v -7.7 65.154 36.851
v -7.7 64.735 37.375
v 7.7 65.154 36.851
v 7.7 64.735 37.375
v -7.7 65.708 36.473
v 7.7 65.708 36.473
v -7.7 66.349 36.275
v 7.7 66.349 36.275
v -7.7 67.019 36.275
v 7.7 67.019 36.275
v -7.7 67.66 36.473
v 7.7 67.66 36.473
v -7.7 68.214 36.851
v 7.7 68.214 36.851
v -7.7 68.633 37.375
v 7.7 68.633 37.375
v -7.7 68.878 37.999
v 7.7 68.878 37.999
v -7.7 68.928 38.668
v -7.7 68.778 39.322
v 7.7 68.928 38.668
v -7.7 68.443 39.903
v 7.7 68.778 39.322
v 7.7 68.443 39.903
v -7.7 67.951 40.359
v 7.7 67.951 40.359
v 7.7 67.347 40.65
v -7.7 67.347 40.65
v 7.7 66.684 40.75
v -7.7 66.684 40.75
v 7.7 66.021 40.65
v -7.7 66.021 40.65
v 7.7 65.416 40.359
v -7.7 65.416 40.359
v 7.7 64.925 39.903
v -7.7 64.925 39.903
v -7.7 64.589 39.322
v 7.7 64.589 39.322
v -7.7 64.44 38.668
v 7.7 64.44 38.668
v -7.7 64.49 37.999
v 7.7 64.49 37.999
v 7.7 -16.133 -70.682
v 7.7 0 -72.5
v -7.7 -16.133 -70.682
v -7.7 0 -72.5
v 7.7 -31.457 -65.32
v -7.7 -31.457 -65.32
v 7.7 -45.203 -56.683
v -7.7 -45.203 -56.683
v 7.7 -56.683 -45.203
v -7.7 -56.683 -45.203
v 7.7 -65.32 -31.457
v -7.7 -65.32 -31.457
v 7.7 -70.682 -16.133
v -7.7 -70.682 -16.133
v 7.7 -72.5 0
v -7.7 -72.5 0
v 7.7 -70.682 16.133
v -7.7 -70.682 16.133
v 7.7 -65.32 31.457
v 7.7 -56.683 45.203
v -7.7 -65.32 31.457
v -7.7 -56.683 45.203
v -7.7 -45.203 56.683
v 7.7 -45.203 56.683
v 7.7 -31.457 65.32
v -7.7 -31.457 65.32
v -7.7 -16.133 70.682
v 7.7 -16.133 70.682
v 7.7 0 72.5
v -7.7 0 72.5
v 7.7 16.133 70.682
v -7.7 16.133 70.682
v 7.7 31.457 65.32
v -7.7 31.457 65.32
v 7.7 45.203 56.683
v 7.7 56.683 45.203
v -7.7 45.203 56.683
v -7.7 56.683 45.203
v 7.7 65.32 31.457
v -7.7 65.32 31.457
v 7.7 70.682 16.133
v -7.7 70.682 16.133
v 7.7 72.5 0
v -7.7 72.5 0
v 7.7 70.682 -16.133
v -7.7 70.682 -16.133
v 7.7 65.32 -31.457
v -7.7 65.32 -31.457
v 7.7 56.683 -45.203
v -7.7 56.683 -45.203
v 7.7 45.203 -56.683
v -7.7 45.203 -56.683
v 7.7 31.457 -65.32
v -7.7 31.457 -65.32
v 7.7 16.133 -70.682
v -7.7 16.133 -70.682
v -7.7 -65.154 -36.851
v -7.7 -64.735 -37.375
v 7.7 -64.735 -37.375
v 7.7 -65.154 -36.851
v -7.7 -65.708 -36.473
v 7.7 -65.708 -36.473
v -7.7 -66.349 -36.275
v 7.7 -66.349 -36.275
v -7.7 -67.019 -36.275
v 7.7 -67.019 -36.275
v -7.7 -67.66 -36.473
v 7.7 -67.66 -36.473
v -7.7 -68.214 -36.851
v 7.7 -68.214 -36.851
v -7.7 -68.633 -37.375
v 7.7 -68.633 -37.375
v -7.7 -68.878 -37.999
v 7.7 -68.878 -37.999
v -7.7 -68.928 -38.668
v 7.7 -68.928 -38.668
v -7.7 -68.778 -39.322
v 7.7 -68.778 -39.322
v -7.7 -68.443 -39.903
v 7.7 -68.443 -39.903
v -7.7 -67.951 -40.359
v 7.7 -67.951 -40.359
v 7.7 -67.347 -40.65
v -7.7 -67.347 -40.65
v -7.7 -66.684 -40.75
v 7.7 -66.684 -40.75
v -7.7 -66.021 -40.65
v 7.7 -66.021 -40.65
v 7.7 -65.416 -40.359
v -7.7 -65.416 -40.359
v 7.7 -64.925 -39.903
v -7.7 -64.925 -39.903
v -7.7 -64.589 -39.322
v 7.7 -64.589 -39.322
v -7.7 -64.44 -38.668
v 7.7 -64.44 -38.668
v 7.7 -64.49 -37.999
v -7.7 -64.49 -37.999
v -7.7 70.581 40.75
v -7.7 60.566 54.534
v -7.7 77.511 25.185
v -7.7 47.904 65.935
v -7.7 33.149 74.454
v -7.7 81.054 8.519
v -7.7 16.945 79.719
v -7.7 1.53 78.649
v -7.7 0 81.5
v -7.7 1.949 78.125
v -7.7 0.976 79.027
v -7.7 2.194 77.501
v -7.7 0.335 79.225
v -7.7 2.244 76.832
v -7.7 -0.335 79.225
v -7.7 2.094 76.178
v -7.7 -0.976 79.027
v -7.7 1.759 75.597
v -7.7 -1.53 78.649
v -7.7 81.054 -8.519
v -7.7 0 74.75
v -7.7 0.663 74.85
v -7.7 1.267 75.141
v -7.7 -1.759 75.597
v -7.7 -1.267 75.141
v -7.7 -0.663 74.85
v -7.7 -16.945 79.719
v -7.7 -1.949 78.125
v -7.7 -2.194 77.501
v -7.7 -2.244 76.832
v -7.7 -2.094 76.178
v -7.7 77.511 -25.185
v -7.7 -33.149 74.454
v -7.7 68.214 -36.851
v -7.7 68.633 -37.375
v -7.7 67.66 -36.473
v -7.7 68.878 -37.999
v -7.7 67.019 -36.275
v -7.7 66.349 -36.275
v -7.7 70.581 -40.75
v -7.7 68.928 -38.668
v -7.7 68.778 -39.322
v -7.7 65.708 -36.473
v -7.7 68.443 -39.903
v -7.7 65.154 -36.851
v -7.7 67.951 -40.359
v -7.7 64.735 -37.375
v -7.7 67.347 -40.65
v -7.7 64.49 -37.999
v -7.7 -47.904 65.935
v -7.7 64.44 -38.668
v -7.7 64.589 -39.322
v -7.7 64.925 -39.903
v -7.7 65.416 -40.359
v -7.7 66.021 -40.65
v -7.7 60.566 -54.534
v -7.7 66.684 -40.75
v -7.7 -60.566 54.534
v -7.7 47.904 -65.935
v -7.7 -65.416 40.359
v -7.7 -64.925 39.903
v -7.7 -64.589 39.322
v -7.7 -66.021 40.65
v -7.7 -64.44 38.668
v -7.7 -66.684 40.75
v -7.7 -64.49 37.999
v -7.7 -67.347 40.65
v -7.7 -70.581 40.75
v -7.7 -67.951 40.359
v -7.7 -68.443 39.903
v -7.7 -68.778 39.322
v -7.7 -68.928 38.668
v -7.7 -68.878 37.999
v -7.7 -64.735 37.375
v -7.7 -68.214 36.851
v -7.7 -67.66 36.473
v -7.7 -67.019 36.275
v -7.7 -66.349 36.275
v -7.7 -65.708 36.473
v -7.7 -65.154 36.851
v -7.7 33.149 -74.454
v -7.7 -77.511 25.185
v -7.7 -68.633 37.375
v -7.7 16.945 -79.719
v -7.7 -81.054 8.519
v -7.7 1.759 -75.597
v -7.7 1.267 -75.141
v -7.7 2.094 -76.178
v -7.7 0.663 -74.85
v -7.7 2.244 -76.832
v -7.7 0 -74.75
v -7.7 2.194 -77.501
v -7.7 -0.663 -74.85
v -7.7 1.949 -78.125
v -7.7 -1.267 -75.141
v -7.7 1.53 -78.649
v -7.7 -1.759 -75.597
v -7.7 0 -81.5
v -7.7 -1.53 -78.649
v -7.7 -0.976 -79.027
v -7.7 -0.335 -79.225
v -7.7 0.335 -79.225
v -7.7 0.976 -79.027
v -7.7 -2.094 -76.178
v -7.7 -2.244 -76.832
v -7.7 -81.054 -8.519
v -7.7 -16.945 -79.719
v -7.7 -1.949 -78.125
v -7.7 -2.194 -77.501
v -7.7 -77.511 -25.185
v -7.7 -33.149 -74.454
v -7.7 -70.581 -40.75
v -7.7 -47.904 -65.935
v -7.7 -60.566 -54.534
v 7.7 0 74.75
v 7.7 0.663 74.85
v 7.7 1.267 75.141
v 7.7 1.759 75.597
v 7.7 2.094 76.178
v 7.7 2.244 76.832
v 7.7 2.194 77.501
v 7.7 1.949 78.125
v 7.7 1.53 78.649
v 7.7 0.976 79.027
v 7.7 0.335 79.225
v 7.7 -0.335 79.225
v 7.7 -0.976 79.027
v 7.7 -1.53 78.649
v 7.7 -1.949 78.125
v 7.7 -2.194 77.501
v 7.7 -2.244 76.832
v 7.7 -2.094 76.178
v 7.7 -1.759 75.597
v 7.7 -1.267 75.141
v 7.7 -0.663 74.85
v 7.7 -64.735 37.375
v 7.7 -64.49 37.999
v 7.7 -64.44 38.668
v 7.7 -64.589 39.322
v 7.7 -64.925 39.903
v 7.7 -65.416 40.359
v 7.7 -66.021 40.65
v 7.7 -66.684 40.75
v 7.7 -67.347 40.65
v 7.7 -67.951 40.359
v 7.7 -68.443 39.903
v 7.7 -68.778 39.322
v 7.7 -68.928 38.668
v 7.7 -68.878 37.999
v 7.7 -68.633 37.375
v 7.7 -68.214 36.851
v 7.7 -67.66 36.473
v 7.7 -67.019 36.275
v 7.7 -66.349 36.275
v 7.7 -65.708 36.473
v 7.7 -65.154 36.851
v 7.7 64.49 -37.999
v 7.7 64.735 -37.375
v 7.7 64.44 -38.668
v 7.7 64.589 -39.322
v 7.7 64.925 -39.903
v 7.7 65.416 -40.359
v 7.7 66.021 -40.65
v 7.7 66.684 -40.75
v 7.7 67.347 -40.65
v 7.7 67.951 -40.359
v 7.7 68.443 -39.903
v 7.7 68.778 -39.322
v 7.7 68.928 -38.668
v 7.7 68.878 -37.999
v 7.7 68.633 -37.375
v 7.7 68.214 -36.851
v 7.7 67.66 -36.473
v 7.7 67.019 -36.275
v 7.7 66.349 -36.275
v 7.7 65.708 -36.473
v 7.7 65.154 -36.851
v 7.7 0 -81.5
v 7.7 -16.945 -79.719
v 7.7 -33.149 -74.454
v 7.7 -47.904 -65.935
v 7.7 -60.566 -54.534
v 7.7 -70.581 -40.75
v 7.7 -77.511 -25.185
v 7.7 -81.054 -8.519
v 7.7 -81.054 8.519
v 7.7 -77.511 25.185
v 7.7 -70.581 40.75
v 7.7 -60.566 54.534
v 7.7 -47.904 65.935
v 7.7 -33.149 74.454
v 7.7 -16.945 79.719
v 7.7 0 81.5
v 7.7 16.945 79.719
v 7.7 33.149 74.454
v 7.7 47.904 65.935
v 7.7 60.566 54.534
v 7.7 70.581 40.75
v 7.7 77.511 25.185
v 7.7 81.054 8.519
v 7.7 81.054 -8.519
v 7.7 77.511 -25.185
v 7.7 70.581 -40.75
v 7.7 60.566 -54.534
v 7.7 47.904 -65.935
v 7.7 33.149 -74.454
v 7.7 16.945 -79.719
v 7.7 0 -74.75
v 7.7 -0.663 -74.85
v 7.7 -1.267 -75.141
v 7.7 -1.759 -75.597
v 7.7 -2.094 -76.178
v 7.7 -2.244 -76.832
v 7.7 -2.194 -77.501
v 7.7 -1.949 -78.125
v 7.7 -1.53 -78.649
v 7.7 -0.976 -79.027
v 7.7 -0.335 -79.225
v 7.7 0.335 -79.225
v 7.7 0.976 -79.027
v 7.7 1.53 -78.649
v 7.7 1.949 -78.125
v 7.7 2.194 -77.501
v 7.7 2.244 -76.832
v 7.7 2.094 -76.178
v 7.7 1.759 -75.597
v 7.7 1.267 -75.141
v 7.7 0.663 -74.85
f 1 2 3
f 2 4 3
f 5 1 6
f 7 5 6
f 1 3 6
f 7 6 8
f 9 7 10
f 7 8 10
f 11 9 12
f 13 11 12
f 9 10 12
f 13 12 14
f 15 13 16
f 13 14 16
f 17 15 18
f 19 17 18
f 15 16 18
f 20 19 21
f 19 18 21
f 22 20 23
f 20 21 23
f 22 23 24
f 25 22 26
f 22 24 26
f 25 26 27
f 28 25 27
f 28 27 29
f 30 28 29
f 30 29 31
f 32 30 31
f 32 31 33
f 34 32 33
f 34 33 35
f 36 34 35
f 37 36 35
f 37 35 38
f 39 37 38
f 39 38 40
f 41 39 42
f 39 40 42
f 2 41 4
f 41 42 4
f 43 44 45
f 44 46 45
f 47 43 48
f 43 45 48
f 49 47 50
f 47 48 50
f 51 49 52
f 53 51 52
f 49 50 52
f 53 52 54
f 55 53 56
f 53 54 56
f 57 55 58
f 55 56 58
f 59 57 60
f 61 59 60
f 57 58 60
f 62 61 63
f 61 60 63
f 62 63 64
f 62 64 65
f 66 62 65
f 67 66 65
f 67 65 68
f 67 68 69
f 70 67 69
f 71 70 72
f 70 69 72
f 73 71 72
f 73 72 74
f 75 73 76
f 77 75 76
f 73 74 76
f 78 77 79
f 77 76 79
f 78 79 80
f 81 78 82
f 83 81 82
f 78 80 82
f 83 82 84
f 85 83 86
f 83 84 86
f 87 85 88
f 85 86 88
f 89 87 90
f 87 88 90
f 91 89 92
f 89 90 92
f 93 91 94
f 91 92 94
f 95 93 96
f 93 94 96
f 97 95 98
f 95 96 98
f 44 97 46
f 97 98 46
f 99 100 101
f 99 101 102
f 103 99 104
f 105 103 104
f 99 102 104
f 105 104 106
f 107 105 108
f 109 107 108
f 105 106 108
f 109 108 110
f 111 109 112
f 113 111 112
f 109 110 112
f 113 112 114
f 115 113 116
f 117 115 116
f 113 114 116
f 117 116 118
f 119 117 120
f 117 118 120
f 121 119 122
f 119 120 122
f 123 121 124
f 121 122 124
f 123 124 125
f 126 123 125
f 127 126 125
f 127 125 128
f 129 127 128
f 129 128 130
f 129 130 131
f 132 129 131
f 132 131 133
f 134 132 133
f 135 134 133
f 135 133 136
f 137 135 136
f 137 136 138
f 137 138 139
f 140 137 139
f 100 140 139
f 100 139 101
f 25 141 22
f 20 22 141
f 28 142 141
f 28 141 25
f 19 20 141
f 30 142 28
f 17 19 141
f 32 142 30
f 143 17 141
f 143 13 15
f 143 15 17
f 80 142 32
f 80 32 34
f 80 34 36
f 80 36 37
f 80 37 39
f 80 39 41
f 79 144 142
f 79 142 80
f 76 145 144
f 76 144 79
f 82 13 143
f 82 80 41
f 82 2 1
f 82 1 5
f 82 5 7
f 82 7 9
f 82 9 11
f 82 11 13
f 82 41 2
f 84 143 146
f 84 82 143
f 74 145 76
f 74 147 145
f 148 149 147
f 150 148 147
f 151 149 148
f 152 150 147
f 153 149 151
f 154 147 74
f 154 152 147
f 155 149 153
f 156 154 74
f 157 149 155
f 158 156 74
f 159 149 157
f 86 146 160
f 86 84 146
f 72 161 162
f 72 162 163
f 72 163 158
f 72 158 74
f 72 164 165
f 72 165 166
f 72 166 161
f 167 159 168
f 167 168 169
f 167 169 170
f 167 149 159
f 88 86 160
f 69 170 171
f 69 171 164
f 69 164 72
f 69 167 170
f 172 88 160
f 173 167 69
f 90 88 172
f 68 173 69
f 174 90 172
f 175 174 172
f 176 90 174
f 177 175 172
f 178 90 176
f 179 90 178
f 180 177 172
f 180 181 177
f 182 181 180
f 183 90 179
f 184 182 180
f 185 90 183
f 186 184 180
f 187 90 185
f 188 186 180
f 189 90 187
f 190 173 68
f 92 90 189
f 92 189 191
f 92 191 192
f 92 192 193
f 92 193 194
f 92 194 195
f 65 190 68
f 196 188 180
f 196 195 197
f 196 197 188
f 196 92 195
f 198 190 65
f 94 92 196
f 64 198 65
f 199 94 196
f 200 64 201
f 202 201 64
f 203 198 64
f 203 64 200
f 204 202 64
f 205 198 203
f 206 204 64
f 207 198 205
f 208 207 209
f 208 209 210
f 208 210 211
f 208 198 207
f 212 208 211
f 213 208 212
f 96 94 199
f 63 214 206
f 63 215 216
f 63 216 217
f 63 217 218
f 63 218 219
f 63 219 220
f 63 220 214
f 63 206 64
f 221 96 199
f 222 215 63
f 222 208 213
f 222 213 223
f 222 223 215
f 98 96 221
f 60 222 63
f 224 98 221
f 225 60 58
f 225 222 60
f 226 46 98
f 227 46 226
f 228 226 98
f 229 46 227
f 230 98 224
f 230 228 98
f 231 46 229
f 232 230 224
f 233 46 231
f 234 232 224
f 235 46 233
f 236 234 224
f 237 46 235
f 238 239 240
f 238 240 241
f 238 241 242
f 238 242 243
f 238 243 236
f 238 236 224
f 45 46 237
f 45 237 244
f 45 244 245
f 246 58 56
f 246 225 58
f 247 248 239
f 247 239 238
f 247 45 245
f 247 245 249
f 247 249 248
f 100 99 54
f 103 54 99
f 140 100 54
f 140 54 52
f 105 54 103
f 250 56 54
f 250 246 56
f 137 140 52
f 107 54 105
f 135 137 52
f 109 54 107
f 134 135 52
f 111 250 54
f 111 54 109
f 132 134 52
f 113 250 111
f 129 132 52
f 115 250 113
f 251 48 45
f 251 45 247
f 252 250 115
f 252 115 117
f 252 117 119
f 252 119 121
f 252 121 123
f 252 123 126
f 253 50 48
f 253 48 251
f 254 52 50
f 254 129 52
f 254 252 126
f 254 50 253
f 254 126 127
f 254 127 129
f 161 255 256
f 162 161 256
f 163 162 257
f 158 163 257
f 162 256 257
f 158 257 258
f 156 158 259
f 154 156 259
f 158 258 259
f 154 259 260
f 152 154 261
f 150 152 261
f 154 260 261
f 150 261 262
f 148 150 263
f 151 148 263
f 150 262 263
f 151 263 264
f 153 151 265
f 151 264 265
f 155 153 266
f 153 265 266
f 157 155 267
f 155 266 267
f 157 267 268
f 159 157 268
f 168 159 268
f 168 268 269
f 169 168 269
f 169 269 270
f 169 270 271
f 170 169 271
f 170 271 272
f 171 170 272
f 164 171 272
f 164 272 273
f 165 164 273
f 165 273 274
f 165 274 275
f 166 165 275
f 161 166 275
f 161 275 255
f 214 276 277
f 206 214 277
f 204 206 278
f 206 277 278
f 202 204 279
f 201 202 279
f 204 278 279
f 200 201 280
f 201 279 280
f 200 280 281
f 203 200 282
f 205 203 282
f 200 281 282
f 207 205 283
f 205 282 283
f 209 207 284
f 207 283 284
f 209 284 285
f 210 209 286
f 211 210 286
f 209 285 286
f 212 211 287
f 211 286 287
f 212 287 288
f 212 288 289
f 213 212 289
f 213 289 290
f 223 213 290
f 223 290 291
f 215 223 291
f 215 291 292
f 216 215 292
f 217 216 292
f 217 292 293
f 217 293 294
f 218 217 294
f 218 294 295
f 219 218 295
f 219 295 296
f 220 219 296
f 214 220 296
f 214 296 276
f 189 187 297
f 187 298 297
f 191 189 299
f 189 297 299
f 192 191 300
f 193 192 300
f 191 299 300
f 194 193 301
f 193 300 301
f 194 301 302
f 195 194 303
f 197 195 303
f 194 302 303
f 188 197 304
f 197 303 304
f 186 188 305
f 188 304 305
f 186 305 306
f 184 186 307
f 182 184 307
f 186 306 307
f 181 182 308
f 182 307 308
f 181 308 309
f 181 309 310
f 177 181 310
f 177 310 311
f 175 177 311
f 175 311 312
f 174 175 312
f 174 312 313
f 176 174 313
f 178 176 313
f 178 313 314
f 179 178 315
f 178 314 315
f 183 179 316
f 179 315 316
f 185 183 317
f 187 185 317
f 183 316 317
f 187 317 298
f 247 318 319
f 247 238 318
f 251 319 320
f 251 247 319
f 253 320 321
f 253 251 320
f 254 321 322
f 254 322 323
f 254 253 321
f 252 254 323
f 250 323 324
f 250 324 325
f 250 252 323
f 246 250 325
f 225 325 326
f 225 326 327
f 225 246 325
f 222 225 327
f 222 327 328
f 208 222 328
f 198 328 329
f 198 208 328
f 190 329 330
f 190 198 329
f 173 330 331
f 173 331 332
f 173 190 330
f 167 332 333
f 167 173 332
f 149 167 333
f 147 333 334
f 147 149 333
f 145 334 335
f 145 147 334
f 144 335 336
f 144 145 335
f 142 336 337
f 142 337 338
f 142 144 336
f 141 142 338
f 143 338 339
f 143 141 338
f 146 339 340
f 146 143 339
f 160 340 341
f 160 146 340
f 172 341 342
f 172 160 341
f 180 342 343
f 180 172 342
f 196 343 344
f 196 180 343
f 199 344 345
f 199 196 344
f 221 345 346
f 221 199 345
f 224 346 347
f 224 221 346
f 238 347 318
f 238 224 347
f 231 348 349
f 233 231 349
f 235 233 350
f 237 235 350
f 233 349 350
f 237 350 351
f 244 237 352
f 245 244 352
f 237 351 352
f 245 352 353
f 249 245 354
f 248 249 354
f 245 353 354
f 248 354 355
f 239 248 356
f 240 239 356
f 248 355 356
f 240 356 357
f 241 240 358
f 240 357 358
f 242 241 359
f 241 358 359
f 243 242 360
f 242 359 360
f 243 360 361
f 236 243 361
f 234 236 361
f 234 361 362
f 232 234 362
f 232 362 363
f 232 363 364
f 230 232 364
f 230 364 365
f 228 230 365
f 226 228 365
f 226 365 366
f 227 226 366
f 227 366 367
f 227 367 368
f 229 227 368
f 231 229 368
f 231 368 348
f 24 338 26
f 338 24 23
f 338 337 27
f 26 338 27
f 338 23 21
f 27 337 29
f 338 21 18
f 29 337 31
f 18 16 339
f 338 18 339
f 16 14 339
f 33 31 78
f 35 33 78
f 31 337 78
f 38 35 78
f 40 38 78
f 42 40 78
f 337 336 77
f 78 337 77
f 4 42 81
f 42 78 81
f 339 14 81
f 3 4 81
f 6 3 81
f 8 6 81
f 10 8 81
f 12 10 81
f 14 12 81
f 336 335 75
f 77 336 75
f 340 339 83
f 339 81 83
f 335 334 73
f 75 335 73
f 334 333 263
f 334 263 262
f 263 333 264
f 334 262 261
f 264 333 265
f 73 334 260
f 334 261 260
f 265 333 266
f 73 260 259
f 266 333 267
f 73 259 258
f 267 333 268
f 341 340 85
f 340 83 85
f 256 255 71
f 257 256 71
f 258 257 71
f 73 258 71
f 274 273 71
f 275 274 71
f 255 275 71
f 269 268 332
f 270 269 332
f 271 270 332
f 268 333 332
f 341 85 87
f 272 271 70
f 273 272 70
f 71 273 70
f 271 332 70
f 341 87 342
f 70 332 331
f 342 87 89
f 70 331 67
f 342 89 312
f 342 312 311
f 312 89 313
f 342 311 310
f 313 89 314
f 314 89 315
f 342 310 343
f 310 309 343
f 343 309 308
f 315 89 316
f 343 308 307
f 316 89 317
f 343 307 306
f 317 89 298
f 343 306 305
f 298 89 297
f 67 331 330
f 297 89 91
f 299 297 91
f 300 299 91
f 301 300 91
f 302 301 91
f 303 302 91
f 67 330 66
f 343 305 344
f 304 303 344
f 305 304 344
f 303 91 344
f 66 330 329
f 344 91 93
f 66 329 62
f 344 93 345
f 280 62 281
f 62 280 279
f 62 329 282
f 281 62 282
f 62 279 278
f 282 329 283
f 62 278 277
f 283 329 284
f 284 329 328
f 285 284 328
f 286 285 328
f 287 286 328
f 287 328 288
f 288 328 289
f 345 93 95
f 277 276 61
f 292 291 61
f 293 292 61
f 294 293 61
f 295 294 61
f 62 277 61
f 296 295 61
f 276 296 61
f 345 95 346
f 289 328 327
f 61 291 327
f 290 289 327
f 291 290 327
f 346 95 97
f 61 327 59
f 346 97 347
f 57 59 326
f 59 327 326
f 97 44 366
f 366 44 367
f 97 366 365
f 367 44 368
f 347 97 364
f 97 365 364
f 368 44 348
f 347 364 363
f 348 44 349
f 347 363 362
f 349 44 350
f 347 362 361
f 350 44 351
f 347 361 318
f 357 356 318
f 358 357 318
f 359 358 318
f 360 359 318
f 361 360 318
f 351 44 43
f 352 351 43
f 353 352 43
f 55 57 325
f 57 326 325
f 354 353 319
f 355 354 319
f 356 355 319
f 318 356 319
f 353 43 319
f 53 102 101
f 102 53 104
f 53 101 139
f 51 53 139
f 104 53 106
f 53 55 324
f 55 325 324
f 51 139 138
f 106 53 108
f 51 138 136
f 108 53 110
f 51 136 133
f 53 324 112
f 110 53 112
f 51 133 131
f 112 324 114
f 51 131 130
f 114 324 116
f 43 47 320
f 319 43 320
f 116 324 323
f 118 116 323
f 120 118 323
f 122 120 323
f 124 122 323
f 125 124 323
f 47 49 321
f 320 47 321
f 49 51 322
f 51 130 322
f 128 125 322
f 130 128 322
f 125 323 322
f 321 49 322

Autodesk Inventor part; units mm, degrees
ref_plane "YZ Plane" through (0, 0, 0) normal (1, 0, 0) x (0, 1, 0)
ref_plane "XZ Plane" through (0, 0, 0) normal (0, 1, 0) x (-1, 0, 0)
ref_plane "XY Plane" through (0, 0, 0) normal (0, 0, 1) x (1, 0, 0)
sketch "Sketch1" plane through (0, 0, 0) normal (0, 1, 0) x (-1, 0, 0)
  line L0 (0, -83.3) -> (0, -70.7) construction
  line L1 (-10.78, 0) -> (10.78, 0) construction
  line L2 (-7.7, -72.5) -> (7.7, -72.5)
  line L3 (-7.7, -72.5) -> (-7.7, -81.5)
  line L4 (-7.7, -81.5) -> (7.7, -81.5)
  line L5 (7.7, -81.5) -> (7.7, -72.5)
  dimension "d30" = 15.4
  dimension "d31" = 9
  dimension "d47" = 72.5
revolve "Revolution1" add sketch "Sketch1" angle 360 about axis through (0, 0, 0) along (-1, 0, 0)
sketch "Sketch2" plane through (-7.7, 0, 0) normal (-1, 0, 0) x (0, 0, 1)
  line L0 (0, 114.1) -> (0, -114.1) construction
  line L1 (-114.1, 0) -> (114.1, 0) construction
  circle A0 centre (0, 0) radius 72.5 projected
  circle A1 centre (0, 0) radius 81.5 projected
  circle A2 centre (0, 0) radius 77 construction
  point P0 (-77, 0)
  dimension "d33" = 4.5
  dimension "d34" = 4.5
hole "Hole1" at (-7.7, 0, -77) direction (1, 0, 0) diameter 4.5 end through all clearance for "Flat Head Machine Screw" size "M4" standard "Ansi Metric M Profile"
pattern_circular "Circular Pattern1" count 6 over 360 about axis through (-10, 0, 0) along (1, 0, 0) of "Hole1"
equation "\"d33\" = d34"
equation "\"D_ring\" = D_ext"
equation "\"D_ext\" = 139.15534"
properties part number "Adapter_stages_planetary" material "Aluminum 6061"
